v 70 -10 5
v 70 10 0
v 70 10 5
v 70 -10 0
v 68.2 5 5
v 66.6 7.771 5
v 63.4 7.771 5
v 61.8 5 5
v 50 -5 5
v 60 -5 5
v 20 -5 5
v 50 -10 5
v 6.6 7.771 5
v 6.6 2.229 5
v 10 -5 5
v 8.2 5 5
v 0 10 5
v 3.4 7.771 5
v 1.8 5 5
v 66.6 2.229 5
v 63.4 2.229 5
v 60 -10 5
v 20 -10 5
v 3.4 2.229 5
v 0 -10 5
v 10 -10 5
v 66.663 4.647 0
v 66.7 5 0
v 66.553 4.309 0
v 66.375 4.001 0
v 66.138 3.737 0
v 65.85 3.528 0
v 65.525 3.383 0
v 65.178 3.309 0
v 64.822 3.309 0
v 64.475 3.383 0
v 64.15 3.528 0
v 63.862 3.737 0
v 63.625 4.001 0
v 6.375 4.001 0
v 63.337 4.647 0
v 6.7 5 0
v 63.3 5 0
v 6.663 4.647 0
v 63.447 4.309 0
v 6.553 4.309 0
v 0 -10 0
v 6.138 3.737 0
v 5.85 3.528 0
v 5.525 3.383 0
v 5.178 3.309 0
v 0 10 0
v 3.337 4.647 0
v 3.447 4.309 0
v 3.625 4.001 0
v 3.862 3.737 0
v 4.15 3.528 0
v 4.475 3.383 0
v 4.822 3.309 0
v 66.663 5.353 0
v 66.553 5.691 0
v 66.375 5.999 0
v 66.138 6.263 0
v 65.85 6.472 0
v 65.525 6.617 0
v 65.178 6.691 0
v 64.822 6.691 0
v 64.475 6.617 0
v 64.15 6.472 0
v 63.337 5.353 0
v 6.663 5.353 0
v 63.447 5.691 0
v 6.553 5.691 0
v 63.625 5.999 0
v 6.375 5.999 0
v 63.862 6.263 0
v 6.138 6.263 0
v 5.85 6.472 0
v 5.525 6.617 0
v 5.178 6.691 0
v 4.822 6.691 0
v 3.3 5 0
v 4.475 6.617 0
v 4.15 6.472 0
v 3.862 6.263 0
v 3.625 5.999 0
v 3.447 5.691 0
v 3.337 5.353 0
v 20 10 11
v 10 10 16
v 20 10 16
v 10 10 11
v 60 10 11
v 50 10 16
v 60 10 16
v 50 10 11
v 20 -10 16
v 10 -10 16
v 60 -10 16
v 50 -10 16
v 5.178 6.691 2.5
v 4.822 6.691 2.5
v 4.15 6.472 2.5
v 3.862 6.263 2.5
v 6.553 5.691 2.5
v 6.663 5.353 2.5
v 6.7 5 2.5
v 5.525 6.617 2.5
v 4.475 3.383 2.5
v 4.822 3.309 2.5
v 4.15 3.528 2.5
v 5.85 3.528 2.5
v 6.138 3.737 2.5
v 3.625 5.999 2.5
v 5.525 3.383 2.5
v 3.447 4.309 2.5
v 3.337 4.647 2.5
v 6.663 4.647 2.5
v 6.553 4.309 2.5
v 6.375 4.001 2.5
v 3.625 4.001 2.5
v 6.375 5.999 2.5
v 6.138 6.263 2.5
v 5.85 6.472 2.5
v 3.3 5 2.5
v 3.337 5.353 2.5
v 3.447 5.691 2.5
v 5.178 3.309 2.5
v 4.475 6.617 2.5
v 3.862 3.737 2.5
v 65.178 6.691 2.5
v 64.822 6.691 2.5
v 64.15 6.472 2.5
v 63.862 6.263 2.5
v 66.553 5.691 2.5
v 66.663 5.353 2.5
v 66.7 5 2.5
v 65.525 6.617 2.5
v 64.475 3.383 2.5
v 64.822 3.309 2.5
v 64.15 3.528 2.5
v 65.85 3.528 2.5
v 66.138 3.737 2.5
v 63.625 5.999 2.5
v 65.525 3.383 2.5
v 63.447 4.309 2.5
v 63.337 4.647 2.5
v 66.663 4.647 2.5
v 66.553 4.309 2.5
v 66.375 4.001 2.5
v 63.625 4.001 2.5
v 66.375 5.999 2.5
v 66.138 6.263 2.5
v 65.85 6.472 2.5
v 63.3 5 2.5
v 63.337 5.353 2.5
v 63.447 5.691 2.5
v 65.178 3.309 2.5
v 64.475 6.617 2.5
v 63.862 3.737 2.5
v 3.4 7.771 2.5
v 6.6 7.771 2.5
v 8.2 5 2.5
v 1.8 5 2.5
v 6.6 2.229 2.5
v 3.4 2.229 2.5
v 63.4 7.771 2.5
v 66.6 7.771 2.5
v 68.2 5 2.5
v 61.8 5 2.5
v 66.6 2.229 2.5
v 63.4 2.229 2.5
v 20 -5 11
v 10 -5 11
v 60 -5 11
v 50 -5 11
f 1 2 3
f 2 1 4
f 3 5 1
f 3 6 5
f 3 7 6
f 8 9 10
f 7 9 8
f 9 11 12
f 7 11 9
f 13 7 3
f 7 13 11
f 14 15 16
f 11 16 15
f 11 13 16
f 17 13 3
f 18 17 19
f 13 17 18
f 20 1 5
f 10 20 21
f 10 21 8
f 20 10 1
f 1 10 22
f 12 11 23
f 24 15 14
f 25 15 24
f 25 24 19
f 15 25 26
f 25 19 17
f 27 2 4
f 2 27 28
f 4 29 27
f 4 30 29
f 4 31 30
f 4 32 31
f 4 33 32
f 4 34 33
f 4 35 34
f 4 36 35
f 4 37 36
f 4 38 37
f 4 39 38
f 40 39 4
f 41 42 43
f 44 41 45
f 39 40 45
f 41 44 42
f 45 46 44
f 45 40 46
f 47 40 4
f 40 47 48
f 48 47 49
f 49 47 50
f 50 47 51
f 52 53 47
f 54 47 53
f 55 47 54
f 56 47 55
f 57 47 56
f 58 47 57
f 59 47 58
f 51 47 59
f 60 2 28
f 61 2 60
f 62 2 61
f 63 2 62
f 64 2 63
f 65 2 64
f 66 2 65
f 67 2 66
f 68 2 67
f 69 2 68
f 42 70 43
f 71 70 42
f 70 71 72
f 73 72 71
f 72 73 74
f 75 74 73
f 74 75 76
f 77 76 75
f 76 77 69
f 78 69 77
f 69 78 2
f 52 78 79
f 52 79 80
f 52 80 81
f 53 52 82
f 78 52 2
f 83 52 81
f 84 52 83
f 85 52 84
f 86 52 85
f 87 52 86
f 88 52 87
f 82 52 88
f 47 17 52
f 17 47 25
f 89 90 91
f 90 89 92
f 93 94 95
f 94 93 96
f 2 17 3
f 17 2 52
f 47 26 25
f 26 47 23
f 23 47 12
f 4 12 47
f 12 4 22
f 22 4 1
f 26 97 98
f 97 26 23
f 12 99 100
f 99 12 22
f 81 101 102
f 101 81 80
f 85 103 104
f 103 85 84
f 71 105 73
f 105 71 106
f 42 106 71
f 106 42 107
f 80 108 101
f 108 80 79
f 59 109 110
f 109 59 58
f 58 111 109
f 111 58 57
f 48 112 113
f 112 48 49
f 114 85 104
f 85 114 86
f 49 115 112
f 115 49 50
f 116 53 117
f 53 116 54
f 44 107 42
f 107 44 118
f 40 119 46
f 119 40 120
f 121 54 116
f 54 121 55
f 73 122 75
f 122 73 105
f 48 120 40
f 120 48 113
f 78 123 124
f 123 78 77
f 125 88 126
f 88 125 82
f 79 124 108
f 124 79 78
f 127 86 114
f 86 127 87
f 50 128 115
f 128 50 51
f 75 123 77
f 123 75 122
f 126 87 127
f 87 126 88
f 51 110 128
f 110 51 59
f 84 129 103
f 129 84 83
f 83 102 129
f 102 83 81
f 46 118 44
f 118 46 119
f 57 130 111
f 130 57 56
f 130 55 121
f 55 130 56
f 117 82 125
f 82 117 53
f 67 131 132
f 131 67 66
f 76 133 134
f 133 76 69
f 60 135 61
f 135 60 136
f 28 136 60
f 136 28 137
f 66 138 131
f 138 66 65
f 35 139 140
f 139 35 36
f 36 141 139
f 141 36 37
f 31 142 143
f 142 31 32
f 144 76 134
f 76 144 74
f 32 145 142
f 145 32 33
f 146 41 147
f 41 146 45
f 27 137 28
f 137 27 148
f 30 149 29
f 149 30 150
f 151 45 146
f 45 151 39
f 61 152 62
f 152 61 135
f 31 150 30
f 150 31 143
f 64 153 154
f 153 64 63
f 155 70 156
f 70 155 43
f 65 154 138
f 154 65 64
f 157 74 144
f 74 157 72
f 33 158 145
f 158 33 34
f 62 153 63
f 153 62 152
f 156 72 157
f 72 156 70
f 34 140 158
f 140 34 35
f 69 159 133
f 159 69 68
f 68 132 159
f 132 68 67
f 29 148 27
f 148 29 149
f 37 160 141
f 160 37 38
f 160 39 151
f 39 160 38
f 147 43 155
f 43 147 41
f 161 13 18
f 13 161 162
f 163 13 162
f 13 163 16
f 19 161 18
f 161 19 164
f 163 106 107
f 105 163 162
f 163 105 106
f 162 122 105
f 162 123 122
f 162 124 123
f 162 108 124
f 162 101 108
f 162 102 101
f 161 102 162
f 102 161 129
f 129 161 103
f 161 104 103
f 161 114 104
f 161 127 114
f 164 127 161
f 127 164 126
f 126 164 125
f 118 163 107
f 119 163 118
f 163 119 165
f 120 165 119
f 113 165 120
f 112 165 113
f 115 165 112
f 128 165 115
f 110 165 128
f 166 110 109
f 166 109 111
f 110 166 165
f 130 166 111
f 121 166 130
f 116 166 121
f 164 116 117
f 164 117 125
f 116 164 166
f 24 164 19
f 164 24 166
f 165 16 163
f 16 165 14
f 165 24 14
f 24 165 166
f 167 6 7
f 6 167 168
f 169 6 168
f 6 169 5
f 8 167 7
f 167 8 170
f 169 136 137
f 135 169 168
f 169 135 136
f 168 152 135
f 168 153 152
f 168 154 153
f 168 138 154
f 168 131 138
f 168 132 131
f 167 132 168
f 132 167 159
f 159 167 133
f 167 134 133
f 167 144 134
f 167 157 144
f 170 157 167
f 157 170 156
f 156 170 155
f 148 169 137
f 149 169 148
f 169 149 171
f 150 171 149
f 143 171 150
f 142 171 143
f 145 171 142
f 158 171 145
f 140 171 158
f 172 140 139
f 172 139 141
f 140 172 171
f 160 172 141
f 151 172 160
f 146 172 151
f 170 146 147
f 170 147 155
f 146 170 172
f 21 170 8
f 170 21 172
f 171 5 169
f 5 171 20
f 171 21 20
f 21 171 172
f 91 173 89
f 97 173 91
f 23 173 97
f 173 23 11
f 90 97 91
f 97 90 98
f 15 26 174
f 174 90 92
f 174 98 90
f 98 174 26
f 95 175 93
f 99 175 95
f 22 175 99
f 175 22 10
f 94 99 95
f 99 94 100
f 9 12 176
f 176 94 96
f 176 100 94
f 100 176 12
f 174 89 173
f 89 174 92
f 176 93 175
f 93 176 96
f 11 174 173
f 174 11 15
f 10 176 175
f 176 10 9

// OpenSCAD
union() {

    difference() {
        translate([0,-10,0])cube([70,20,5]);
        translate([5,5,0])cylinder(h=10, r=1.7, $fs=0.01);
        translate([65,5,0])cylinder(h=10, r=1.7, $fs=0.01);
        translate([5,5,2.5])cylinder(10,3.2,3.2, $fn=6);
        translate([65,5,2.5])cylinder(10,3.2,3.2, $fn=6);
    }

    difference() {
        union() {
            translate([10,-10,0])cube([10,20,16]);
            translate([50,-10,0])cube([10,20,16]);
        }
        translate([10,-5,5])cube([50,15,6]);
    }
}
